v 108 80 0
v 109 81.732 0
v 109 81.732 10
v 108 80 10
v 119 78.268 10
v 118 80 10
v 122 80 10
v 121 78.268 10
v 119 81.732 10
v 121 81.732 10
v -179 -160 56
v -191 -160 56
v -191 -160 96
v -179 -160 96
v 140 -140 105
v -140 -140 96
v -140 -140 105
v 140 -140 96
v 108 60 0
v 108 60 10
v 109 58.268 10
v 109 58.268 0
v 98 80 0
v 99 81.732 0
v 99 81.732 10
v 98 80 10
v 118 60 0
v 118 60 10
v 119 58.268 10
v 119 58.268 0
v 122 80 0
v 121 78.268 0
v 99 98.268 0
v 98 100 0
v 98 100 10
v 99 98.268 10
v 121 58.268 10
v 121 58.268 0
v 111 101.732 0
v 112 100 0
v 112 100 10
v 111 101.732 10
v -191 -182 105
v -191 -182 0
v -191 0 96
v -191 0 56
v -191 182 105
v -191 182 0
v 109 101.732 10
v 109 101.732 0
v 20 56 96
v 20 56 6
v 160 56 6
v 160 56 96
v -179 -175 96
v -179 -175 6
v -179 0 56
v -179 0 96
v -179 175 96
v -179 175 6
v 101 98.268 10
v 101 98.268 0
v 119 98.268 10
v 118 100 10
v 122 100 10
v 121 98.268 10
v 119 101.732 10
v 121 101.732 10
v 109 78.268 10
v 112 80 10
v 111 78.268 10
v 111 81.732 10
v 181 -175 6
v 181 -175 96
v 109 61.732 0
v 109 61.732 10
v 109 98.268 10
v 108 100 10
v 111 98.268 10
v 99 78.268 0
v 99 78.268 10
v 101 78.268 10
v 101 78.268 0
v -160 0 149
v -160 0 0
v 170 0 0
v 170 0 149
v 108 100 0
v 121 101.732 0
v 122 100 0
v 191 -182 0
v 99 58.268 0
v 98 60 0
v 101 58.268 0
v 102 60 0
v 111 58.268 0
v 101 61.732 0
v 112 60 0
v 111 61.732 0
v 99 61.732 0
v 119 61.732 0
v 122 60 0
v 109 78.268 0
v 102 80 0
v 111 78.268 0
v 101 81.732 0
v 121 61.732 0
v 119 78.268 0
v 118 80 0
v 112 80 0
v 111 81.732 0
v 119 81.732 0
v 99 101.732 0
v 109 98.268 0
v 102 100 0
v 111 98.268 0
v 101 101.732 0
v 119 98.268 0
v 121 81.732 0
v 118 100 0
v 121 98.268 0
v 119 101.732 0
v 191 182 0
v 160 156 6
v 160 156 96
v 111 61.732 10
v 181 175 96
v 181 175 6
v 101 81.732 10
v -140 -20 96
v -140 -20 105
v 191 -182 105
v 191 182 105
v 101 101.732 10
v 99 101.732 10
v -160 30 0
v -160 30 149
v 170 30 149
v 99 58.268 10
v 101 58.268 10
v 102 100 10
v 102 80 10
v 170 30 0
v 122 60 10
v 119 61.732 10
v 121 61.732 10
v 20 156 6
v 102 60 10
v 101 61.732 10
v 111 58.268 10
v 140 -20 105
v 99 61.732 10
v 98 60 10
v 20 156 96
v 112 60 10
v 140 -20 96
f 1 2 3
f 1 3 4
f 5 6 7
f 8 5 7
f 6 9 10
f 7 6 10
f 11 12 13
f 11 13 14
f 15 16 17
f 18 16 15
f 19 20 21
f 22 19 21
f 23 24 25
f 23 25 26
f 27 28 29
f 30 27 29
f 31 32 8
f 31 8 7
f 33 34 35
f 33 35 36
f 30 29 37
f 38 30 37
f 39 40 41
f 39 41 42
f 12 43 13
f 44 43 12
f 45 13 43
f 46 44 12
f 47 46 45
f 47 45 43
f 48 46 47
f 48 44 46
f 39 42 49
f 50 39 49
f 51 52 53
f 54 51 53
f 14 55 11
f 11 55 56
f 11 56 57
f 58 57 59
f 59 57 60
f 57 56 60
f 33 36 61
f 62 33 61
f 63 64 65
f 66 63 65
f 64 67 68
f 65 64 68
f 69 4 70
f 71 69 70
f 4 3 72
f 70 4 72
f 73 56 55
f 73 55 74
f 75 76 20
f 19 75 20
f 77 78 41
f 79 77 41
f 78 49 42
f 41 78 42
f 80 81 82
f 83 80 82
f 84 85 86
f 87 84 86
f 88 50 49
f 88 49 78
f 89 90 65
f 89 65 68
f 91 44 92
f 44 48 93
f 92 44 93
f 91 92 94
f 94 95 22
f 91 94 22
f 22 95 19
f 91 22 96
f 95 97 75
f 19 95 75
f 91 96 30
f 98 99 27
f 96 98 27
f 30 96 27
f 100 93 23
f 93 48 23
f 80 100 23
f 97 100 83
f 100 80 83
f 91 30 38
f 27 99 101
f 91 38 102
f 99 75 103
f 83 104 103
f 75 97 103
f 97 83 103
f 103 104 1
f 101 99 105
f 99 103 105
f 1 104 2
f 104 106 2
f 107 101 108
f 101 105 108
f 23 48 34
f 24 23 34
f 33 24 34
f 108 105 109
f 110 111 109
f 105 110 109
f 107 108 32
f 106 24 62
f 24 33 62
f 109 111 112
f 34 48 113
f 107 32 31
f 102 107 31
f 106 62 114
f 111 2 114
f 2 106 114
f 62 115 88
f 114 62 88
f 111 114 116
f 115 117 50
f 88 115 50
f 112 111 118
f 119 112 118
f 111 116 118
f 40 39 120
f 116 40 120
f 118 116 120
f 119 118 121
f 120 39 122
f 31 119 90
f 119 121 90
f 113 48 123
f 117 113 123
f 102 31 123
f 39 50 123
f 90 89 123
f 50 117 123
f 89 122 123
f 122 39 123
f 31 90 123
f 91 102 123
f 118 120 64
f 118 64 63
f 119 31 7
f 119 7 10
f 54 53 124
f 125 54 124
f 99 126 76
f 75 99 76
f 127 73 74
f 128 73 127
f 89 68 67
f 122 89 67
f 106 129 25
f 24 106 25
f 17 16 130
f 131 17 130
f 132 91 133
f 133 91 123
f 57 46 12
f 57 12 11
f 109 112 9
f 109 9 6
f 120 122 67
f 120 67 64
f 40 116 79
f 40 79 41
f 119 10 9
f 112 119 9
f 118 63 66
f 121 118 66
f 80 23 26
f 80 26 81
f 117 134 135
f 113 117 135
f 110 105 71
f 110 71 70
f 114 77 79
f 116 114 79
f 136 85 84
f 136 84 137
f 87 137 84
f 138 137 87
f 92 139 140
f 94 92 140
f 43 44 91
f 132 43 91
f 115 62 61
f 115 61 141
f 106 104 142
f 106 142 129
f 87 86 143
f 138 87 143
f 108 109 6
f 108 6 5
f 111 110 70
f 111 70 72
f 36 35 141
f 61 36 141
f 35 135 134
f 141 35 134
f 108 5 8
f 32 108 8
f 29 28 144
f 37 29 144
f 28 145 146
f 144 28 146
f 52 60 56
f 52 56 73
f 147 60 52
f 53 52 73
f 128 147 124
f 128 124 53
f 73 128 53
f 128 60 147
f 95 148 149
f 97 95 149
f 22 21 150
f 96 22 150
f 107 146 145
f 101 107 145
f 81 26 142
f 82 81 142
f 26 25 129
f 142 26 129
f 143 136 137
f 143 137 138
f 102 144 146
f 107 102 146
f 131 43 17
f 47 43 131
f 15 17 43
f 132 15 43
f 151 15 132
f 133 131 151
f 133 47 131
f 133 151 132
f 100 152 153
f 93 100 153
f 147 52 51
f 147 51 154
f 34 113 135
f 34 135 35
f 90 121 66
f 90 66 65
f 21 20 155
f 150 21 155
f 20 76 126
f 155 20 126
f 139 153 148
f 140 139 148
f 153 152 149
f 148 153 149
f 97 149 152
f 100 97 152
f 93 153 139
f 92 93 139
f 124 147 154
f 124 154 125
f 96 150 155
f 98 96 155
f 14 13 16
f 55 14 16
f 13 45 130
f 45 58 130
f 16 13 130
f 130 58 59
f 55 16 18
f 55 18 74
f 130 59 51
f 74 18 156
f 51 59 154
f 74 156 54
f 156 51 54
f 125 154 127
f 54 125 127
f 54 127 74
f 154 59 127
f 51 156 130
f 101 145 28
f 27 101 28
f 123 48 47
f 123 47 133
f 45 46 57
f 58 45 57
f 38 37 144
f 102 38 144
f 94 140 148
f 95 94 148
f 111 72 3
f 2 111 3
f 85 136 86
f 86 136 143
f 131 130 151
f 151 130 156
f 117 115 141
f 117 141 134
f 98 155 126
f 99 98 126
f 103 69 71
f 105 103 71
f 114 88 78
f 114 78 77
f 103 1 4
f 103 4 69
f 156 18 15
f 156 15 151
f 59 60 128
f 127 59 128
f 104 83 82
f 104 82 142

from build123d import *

# Parameters (mm, degrees)
BOX_W          = 382
BOX_H          = 364
BOX_DEPTH      = 105
BOX001_W       = 360
BOX001_H       = 350
BOX001_DEPTH   = 90
BOX003_W       = 280
BOX003_H       = 120
BOX003_DEPTH   = 50
BOX004_W       = 140
BOX004_H       = 100
BOX004_DEPTH   = 90
BOX005_W       = 30
BOX005_H       = 160
BOX005_DEPTH   = 40
PRISM_DEPTH    = 10
PRISM001_DEPTH = 10
PRISM002_DEPTH = 10
PRISM003_DEPTH = 10
PRISM004_DEPTH = 10
PRISM005_DEPTH = 10
PRISM006_DEPTH = 10
PRISM007_DEPTH = 10
PRISM008_DEPTH = 10
BOX002_W       = 330
BOX002_H       = 30
BOX002_DEPTH   = 149


with BuildPart() as body:
    # Box → Box (join)
    with BuildSketch(Plane(origin=(-191, -182, 0), x_dir=(1, 0, 0), z_dir=(0, 0, 1))):
        with Locations((191, 182)):
            Rectangle(BOX_W, BOX_H)
    extrude(amount=BOX_DEPTH)

    # Box001 → Box001 (cut)
    with BuildSketch(Plane(origin=(-179, -175, 6), x_dir=(1, 0, 0), z_dir=(0, 0, 1))):
        with Locations((180, 175)):
            Rectangle(BOX001_W, BOX001_H)
    extrude(amount=BOX001_DEPTH, mode=Mode.SUBTRACT)

    # Box003 → Box003 (cut)
    with BuildSketch(Plane(origin=(-140, -140, 90), x_dir=(1, 0, 0), z_dir=(0, 0, 1))):
        with Locations((140, 60)):
            Rectangle(BOX003_W, BOX003_H)
    extrude(amount=BOX003_DEPTH, mode=Mode.SUBTRACT)

    # Box004 → Box004 (join)
    with BuildSketch(Plane(origin=(20, 56, 6), x_dir=(1, 0, 0), z_dir=(0, 0, 1))):
        with Locations((70, 50)):
            Rectangle(BOX004_W, BOX004_H)
    extrude(amount=BOX004_DEPTH)

    # Box005 → Box005 (cut)
    with BuildSketch(Plane(origin=(-193, -160, 56), x_dir=(1, 0, 0), z_dir=(0, 0, 1))):
        with Locations((15, 80)):
            Rectangle(BOX005_W, BOX005_H)
    extrude(amount=BOX005_DEPTH, mode=Mode.SUBTRACT)

    # Prism → Prism (cut)
    with BuildSketch(Plane(origin=(100, 100, 0), x_dir=(1, 0, 0), z_dir=(0, 0, 1))):
        Polygon((2, 0), (1, 1.732051), (-1, 1.732051), (-2, 0), (-1, -1.732051), (1, -1.732051), align=None)
    extrude(amount=PRISM_DEPTH, mode=Mode.SUBTRACT)

    # Prism001 → Prism001 (cut)
    with BuildSketch(Plane(origin=(110, 100, 0), x_dir=(1, 0, 0), z_dir=(0, 0, 1))):
        Polygon((2, 0), (1, 1.732051), (-1, 1.732051), (-2, 0), (-1, -1.732051), (1, -1.732051), align=None)
    extrude(amount=PRISM001_DEPTH, mode=Mode.SUBTRACT)

    # Prism002 → Prism002 (cut)
    with BuildSketch(Plane(origin=(120, 100, 0), x_dir=(1, 0, 0), z_dir=(0, 0, 1))):
        Polygon((2, 0), (1, 1.732051), (-1, 1.732051), (-2, 0), (-1, -1.732051), (1, -1.732051), align=None)
    extrude(amount=PRISM002_DEPTH, mode=Mode.SUBTRACT)

    # Prism003 → Prism003 (cut)
    with BuildSketch(Plane(origin=(100, 80, 0), x_dir=(1, 0, 0), z_dir=(0, 0, 1))):
        Polygon((2, 0), (1, 1.732051), (-1, 1.732051), (-2, 0), (-1, -1.732051), (1, -1.732051), align=None)
    extrude(amount=PRISM003_DEPTH, mode=Mode.SUBTRACT)

    # Prism004 → Prism004 (cut)
    with BuildSketch(Plane(origin=(110, 80, 0), x_dir=(1, 0, 0), z_dir=(0, 0, 1))):
        Polygon((2, 0), (1, 1.732051), (-1, 1.732051), (-2, 0), (-1, -1.732051), (1, -1.732051), align=None)
    extrude(amount=PRISM004_DEPTH, mode=Mode.SUBTRACT)

    # Prism005 → Prism005 (cut)
    with BuildSketch(Plane(origin=(120, 80, 0), x_dir=(1, 0, 0), z_dir=(0, 0, 1))):
        Polygon((2, 0), (1, 1.732051), (-1, 1.732051), (-2, 0), (-1, -1.732051), (1, -1.732051), align=None)
    extrude(amount=PRISM005_DEPTH, mode=Mode.SUBTRACT)

    # Prism006 → Prism006 (cut)
    with BuildSketch(Plane(origin=(100, 60, 0), x_dir=(1, 0, 0), z_dir=(0, 0, 1))):
        Polygon((2, 0), (1, 1.732051), (-1, 1.732051), (-2, 0), (-1, -1.732051), (1, -1.732051), align=None)
    extrude(amount=PRISM006_DEPTH, mode=Mode.SUBTRACT)

    # Prism007 → Prism007 (cut)
    with BuildSketch(Plane(origin=(110, 60, 0), x_dir=(1, 0, 0), z_dir=(0, 0, 1))):
        Polygon((2, 0), (1, 1.732051), (-1, 1.732051), (-2, 0), (-1, -1.732051), (1, -1.732051), align=None)
    extrude(amount=PRISM007_DEPTH, mode=Mode.SUBTRACT)

    # Prism008 → Prism008 (cut)
    with BuildSketch(Plane(origin=(120, 60, 0), x_dir=(1, 0, 0), z_dir=(0, 0, 1))):
        Polygon((2, 0), (1, 1.732051), (-1, 1.732051), (-2, 0), (-1, -1.732051), (1, -1.732051), align=None)
    extrude(amount=PRISM008_DEPTH, mode=Mode.SUBTRACT)


with BuildPart() as max_card:
    # Box002 → Box002 (join)
    with BuildSketch(Plane(origin=(-160, 0, 0), x_dir=(1, 0, 0), z_dir=(0, 0, 1))):
        with Locations((165, 15)):
            Rectangle(BOX002_W, BOX002_H)
    extrude(amount=BOX002_DEPTH)


solid = Compound([body.part, max_card.part])
